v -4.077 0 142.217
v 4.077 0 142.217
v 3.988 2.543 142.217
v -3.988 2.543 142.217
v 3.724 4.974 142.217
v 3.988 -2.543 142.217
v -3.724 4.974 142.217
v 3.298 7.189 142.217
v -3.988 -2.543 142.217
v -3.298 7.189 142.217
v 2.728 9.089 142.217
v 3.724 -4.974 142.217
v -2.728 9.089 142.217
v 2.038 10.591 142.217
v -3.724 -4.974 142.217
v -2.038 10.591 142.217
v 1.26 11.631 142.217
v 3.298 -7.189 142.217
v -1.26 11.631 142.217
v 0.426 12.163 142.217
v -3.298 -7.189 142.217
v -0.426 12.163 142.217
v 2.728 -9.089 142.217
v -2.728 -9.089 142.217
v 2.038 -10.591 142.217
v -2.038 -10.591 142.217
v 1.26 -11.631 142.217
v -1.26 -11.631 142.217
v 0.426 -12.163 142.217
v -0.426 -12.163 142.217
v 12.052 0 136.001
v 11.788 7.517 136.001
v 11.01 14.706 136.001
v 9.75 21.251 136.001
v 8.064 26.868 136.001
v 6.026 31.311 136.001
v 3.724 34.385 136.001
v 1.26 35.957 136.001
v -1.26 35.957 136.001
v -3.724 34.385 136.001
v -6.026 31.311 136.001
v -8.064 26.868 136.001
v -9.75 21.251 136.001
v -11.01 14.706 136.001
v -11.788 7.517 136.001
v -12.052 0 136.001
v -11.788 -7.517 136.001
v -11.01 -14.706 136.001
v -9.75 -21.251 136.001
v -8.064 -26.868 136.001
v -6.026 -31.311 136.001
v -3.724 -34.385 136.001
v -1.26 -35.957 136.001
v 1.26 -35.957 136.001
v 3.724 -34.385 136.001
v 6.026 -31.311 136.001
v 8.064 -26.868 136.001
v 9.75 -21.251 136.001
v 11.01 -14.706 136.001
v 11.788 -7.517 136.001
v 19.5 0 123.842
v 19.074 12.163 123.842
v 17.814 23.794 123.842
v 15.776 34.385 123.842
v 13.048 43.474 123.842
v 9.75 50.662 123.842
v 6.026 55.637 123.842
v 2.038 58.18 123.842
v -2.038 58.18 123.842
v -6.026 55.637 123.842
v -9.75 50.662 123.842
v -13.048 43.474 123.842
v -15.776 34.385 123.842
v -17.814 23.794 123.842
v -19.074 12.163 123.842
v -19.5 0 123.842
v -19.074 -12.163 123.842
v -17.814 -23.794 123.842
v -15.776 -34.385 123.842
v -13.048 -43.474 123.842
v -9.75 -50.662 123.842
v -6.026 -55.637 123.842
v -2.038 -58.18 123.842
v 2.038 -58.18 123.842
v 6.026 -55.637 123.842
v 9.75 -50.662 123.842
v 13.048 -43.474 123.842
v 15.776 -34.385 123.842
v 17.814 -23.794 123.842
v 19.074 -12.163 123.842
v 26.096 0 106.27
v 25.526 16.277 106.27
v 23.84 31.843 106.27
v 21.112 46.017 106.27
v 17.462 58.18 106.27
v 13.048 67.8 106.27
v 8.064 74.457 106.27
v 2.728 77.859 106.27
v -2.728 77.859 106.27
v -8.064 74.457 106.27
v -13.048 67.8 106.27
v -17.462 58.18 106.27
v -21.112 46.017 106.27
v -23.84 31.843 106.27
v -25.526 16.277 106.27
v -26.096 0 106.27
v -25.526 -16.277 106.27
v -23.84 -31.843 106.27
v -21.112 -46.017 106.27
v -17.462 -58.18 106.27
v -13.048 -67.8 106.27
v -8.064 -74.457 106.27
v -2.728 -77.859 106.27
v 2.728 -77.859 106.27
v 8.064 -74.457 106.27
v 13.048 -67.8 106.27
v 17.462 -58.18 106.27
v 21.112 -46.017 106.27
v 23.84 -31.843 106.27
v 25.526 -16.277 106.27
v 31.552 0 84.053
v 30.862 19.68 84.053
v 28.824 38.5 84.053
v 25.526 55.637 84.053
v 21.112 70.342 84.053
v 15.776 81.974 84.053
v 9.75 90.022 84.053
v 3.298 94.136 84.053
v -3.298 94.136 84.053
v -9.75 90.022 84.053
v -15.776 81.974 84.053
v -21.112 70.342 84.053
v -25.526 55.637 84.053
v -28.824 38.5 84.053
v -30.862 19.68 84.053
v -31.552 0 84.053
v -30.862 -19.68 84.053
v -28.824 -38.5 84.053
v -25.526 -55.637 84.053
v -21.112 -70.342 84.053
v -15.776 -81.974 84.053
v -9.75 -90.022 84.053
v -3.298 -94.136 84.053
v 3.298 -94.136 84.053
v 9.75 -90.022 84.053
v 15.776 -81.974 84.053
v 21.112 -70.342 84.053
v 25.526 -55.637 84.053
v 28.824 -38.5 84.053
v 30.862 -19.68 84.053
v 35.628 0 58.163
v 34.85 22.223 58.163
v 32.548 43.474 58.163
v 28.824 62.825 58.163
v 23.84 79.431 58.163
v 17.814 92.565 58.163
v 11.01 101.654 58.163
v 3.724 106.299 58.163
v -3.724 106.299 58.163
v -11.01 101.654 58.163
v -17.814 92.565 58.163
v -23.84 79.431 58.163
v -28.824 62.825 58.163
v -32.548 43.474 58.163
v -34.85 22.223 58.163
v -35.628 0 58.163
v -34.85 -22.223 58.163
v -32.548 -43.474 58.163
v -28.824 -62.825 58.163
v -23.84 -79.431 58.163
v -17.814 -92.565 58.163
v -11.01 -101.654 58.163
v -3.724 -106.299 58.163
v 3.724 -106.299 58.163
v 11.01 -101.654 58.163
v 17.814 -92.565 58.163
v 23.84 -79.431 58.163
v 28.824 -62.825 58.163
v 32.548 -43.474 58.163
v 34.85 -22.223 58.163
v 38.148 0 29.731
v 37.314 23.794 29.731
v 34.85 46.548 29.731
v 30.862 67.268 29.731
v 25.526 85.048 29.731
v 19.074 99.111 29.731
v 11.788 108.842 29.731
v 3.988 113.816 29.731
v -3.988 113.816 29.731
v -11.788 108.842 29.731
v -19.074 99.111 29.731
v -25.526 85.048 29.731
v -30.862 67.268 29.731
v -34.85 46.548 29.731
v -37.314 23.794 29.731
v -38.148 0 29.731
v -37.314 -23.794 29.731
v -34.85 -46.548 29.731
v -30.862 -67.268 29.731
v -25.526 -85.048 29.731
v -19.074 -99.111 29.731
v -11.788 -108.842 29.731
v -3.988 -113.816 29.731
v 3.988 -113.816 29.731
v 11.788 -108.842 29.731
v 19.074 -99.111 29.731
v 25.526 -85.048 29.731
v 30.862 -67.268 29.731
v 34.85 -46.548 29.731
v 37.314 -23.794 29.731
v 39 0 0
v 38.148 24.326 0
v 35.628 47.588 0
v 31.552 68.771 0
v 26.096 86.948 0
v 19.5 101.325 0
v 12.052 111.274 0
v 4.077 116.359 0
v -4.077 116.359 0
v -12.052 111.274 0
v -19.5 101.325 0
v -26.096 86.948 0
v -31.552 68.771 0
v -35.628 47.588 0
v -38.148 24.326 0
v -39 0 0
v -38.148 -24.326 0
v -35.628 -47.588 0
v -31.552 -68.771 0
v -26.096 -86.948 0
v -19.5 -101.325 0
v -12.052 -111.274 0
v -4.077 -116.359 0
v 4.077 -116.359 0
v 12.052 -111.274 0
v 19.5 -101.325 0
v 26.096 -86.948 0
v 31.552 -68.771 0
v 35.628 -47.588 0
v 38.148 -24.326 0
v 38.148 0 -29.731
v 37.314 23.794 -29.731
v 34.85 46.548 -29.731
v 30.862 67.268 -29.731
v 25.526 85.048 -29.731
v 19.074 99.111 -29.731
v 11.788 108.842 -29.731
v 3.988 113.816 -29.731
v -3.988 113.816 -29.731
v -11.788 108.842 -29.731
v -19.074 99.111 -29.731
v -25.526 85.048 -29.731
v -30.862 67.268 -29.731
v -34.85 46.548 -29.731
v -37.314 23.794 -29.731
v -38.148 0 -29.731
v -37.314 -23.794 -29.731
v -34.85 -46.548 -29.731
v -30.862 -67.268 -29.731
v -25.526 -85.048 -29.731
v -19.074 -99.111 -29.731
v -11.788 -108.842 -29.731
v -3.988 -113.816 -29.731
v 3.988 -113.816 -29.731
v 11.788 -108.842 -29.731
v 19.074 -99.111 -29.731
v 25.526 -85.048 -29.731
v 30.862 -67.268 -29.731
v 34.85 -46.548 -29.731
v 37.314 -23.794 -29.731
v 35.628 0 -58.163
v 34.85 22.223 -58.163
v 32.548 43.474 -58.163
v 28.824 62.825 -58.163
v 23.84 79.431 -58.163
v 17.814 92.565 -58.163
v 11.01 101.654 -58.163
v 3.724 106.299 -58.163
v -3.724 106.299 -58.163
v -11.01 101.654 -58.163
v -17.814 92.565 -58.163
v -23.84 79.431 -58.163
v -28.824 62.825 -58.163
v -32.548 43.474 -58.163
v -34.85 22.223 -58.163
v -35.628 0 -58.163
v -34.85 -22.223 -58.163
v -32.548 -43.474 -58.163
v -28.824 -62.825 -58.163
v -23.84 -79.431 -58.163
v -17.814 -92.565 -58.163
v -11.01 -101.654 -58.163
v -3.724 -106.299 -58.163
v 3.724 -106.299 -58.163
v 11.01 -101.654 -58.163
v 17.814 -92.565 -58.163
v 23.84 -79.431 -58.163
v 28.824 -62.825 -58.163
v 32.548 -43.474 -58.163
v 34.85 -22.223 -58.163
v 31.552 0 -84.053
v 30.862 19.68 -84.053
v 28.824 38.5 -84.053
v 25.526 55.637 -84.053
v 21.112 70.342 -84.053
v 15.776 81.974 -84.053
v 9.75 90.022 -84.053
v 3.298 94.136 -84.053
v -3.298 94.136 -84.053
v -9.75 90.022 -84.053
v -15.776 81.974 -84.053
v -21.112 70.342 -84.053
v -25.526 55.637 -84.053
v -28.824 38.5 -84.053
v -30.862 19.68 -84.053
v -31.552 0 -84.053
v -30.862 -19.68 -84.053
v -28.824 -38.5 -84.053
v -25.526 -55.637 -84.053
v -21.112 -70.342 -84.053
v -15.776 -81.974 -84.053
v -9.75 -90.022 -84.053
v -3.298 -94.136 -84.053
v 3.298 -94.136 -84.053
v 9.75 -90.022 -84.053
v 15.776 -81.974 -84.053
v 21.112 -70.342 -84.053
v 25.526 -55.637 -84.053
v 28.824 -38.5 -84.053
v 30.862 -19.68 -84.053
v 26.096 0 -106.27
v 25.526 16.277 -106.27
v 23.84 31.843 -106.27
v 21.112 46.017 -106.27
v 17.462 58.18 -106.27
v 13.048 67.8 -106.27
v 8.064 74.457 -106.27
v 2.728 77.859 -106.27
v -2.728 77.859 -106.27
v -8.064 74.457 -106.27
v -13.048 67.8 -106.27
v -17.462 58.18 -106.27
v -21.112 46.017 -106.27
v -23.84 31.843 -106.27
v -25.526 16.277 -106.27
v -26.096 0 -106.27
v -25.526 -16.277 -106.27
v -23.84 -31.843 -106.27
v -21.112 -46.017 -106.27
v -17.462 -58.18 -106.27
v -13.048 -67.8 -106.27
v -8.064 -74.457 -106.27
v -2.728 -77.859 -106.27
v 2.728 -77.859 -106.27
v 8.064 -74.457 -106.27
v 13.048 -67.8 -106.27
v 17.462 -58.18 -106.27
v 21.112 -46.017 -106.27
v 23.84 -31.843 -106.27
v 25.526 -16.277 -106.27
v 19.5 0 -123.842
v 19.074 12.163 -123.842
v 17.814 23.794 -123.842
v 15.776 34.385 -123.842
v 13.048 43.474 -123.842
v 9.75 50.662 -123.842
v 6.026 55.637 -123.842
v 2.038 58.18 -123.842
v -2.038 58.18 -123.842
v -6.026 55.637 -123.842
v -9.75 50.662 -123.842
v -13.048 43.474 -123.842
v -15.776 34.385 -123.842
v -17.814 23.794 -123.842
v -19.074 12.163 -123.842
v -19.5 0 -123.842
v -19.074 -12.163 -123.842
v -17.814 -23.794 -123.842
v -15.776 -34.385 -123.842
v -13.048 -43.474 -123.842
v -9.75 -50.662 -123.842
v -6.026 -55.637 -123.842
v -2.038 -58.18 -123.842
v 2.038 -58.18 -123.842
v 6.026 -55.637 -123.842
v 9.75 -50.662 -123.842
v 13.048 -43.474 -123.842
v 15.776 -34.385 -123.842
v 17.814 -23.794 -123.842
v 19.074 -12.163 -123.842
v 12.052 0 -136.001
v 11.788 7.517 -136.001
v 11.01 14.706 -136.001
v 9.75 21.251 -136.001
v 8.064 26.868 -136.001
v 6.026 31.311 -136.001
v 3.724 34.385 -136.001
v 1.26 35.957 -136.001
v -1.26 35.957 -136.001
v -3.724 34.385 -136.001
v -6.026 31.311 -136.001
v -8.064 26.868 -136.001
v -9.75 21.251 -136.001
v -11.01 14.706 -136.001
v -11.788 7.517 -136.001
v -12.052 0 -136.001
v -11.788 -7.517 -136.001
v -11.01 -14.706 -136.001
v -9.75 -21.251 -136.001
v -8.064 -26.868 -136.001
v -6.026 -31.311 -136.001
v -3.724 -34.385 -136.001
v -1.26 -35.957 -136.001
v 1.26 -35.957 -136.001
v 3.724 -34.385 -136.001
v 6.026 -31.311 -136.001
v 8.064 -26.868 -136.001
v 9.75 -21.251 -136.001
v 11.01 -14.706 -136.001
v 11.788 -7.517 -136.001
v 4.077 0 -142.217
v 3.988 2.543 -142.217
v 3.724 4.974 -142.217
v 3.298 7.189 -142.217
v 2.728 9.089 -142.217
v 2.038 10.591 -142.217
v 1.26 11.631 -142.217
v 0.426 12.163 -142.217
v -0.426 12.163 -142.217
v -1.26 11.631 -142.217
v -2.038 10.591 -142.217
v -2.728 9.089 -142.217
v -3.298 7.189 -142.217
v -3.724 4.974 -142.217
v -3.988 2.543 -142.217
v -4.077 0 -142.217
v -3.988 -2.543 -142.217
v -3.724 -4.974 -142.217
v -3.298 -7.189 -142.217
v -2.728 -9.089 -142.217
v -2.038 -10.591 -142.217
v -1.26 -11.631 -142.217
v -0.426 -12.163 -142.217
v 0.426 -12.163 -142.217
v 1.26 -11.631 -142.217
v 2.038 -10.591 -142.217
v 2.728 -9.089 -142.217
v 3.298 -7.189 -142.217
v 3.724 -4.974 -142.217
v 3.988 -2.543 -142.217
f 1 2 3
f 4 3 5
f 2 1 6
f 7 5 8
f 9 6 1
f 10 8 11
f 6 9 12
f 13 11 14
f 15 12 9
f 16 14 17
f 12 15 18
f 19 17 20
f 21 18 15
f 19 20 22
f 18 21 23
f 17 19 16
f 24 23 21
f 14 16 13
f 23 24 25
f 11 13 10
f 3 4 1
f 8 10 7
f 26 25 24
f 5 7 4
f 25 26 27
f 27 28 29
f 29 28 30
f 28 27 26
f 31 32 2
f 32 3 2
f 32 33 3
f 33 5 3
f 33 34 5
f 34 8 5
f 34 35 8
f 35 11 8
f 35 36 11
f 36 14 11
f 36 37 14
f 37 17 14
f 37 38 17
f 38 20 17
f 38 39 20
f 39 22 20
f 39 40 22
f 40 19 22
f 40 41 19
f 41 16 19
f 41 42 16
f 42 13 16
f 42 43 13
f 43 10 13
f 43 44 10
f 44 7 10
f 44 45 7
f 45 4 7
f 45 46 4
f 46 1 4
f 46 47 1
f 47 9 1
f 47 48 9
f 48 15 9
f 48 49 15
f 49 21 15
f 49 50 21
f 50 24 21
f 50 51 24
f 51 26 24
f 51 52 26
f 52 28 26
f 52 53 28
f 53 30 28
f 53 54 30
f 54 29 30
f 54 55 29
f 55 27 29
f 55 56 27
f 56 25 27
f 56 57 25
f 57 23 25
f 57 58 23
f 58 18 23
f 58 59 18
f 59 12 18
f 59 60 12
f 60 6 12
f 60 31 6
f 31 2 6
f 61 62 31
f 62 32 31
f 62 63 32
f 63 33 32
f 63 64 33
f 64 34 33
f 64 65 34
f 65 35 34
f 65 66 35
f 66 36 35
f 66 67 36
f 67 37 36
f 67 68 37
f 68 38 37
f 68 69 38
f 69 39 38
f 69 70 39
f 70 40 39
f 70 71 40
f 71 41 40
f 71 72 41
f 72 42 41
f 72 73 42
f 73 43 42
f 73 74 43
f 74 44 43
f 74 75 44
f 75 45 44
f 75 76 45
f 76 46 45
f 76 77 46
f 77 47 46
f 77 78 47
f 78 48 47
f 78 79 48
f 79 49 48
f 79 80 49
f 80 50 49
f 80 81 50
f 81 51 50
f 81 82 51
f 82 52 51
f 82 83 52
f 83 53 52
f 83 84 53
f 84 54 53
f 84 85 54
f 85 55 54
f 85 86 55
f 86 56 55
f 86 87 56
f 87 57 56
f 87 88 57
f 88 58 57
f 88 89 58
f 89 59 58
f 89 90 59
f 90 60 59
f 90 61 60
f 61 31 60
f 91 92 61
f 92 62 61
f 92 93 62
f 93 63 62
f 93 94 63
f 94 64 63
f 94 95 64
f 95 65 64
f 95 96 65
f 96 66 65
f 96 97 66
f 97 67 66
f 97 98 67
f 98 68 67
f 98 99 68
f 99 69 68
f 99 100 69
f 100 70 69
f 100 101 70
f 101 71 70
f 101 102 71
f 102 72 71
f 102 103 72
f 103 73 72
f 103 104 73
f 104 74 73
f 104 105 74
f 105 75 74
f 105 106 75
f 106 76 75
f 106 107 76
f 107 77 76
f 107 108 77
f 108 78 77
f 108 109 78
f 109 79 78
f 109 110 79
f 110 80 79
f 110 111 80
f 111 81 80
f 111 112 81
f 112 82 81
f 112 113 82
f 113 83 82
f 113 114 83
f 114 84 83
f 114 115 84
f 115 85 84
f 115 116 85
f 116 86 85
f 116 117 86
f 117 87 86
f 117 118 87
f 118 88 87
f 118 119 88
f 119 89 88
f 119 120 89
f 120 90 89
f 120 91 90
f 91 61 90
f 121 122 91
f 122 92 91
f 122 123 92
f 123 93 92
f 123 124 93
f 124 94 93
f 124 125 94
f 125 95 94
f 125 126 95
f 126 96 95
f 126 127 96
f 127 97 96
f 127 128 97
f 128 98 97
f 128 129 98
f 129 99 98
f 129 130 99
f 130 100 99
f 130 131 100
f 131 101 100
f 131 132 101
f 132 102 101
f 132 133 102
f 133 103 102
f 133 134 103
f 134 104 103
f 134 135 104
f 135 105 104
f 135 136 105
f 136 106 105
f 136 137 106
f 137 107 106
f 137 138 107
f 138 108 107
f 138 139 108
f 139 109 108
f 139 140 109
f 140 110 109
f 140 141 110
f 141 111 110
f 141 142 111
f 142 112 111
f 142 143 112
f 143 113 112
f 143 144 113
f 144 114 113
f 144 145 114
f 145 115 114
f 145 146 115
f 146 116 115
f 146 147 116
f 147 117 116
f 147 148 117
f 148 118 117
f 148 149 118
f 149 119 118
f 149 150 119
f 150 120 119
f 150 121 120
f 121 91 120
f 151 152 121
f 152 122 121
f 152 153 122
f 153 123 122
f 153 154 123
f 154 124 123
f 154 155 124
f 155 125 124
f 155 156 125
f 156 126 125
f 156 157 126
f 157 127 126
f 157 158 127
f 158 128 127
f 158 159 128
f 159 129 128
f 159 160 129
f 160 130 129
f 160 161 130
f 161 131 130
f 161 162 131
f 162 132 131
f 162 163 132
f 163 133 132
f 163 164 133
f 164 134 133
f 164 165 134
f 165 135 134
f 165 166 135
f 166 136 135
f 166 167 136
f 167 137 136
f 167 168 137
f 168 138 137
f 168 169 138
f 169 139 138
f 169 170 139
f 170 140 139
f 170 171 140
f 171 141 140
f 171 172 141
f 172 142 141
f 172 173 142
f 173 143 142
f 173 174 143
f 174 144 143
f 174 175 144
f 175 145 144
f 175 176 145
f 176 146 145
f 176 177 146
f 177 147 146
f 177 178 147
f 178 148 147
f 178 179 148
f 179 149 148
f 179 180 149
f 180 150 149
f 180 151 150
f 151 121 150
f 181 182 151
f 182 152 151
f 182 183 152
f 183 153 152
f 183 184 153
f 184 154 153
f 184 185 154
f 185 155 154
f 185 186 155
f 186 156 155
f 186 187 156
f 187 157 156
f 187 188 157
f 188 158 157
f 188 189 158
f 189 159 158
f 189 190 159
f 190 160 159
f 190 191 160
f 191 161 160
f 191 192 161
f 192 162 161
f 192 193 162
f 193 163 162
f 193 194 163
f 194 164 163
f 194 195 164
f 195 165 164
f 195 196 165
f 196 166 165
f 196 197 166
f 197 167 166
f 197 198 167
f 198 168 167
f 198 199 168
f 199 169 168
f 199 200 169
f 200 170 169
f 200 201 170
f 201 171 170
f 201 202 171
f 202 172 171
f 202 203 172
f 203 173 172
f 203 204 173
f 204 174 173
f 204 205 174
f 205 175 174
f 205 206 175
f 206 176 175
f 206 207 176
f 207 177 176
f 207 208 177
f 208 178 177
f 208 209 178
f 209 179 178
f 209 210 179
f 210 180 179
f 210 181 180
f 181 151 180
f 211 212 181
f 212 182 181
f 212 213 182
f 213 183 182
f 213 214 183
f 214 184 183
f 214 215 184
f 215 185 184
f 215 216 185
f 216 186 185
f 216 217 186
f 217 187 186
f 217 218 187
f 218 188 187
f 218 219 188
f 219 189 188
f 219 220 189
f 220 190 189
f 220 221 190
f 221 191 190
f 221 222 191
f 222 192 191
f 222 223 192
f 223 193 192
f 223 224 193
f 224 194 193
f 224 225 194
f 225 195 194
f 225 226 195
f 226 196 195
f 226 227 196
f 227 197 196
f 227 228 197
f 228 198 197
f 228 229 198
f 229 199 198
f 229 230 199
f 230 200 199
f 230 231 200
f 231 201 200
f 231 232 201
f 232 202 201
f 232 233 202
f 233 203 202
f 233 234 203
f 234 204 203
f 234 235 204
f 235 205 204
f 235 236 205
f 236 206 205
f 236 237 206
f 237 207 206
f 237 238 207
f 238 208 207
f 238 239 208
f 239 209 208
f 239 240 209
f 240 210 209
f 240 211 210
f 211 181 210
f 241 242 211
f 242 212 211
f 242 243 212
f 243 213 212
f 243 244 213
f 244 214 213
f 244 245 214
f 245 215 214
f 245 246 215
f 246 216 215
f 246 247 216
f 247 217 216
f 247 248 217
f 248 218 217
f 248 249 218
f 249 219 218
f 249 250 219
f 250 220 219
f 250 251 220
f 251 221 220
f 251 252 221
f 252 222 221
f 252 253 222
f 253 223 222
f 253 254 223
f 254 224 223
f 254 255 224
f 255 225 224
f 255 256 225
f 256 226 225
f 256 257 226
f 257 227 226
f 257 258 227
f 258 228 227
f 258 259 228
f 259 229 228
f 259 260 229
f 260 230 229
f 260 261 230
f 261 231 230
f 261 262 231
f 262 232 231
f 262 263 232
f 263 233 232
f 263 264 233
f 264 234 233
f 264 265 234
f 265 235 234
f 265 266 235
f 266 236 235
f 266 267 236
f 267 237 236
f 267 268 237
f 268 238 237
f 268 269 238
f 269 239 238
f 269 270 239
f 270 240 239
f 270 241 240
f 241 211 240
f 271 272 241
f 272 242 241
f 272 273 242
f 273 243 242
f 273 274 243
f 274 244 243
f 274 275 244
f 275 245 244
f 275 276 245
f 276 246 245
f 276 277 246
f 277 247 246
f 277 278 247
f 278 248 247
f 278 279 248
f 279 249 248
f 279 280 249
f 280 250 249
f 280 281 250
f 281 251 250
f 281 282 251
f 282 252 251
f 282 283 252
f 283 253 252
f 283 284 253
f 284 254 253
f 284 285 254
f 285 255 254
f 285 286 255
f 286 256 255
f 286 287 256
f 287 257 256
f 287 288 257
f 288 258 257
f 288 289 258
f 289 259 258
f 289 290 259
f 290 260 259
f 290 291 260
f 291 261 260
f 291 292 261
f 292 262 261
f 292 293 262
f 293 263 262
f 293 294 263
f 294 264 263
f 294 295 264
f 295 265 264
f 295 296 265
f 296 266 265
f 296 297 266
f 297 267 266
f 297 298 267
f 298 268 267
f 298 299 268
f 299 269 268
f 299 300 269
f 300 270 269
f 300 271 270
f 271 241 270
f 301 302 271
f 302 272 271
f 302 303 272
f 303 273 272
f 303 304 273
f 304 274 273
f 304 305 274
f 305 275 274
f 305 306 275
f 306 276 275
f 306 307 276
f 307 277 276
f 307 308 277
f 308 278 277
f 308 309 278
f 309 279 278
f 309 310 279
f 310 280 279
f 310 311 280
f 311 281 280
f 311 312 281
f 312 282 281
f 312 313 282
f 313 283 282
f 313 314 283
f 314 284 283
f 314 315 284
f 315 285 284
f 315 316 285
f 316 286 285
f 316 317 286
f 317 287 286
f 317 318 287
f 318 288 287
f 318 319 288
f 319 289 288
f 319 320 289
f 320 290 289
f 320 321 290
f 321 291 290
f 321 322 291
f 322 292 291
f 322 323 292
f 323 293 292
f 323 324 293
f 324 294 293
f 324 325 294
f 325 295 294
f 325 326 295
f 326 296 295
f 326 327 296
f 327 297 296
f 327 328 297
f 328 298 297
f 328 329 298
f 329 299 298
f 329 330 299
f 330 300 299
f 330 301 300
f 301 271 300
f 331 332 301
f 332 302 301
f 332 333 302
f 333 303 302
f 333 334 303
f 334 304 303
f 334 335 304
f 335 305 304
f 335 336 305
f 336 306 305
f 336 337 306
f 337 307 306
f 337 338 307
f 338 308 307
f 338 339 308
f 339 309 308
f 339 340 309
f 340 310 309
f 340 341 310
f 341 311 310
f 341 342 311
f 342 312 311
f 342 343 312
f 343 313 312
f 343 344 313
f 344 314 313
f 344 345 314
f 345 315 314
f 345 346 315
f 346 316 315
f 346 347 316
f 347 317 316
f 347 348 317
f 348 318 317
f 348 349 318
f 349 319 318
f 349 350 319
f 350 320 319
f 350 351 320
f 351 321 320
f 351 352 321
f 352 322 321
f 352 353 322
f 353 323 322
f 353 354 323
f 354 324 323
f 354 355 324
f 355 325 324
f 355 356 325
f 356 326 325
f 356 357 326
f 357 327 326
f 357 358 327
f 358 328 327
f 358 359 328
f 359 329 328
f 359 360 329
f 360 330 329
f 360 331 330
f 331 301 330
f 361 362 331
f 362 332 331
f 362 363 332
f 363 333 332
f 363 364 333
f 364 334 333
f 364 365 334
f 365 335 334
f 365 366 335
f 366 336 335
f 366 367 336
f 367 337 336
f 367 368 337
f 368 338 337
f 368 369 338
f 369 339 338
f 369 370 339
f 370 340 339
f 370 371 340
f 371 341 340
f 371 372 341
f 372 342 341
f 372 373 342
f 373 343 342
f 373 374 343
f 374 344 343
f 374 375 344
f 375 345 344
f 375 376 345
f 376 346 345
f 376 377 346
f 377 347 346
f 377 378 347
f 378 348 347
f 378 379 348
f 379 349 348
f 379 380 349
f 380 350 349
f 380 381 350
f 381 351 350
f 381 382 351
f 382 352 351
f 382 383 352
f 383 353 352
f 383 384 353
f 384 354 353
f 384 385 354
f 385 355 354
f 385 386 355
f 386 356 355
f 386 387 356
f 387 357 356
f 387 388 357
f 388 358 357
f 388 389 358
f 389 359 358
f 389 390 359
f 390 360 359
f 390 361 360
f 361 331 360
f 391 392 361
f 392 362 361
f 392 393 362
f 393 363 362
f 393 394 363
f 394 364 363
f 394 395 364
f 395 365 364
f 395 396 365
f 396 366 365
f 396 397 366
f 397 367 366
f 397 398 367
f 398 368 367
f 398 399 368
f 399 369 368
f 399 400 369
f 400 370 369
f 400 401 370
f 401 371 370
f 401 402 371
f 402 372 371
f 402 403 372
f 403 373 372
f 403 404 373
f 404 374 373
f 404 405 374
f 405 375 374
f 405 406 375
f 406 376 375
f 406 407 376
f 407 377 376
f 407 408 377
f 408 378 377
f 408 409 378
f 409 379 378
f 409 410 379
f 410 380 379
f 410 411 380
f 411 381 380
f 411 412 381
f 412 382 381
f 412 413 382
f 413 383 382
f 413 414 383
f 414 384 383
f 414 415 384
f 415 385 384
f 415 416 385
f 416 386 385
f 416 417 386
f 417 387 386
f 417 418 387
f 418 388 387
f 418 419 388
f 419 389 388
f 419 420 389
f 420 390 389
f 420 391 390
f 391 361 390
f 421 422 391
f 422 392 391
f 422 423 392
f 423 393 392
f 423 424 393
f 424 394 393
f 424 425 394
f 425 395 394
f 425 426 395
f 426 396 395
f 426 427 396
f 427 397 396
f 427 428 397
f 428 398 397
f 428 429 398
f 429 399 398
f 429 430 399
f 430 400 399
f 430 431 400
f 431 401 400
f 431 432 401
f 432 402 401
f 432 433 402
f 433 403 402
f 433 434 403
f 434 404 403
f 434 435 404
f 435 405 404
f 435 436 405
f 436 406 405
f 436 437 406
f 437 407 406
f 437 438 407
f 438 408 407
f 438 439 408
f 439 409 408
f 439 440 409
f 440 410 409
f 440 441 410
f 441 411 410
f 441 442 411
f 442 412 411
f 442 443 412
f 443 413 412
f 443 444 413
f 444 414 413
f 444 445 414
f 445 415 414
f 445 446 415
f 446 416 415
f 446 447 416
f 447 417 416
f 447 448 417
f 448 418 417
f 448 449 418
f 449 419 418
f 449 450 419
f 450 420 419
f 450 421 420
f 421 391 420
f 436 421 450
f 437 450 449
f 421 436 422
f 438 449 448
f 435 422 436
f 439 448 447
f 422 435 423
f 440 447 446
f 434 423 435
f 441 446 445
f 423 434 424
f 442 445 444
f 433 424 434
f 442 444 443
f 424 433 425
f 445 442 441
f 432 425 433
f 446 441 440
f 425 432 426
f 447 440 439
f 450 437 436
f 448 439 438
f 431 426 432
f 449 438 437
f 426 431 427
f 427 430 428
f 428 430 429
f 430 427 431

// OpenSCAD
// Generated by SolidPython 1.0.1 on 2020-07-29 00:46:45


scale(v = [3, 9, 11]) {
	sphere(r = 13);
}
/***********************************************
*********      SolidPython code:      **********
************************************************
 
# import packages: SolidPython
from solid import *
from solid.utils import *
from itertools import chain, combinations, permutations


class Resize:

    def __init__(self, scad_file):
        self.scad_file = scad_file
        #self.scad_file = import_scad(scad_file)
        # cone/cylinder param:
        self.r1 = 0
        self.r2 = 0
        self.h = 0
        # rectangular prism param:
        self.w = 0
        self.l = 0
        # ellipse param:
        self.r = 0

    # import OpenScad code (file name corresponds to shape)


    # classify shape + parameters
    def assign(self, param1, param2, param3):
        if self.scad_file == 'cone.scad':
            self.r1 = param1
            self.r2 = param2
            self.h = param3
        elif self.scad_file == 'cylinder.scad':
            self.r1 = param1
            self.r2 = param2
            self.h = param3
        elif self.scad_file == 'rectangularPrism.scad':
            self.h = param1
            self.l = param2
            self.w = param3
        else:
            self.r = param1
            self.h = param2

    # resize parameters
    def iterate(self):
        x = range(3, 20, 2)
        i = 1
        if self.scad_file == 'cone.scad':
            tempList = list(permutations(x, 2))
            for temp in tempList:
                param1 = temp[0]
                param2 = temp[1]
                filepath = 'produced_scad_files/' + 'cone' + str(param1) + '_' + str(param2) + '_' + '.scad'
                scad_render_to_file(cylinder(h=param1, r1=param2, r2=0), filepath)

        elif self.scad_file == 'cylinder.scad':
            tempList = list(permutations(x, 3))
            for temp in tempList:
                param1 = temp[0]
                param2 = temp[1]
                filepath = 'produced_scad_files/' + 'cylinder' + str(param1) + '_' + str(param2) + '_' + '.scad'
                scad_render_to_file(cylinder(h=param1, r1=param2, r2=param2), filepath)

        elif self.scad_file == 'rectangularPrism.scad':
            tempList = list(permutations(x, 3))
            for temp in tempList:
                param1 = temp[0]
                param2 = temp[1]
                param3 = temp[2]
                filepath = 'produced_scad_files/' + 'rectangularPrism' + str(param1) + '_' + str(param2) + '_' + str(
                    param3) + '.scad'
                scad_render_to_file(cube(size=(param1, param2, param3)), filepath)

        elif self.scad_file == 'ellipse.scad':
            tempList = list(permutations(x, 4))
            for temp in tempList:
                param1 = temp[0]
                param2 = temp[1]
                param3 = temp[2]
                param4 = temp[3]
                filepath = 'produced_scad_files/' + 'ellipse' + str(param1) + '_' + str(param2) + '_' + str(param3) + '_' + str(param4) + '.scad'
                scad_render_to_file(scale([param1, param2, param3])(sphere(r=param4)), filepath)

    def render_to_scadfile(self):
        scad_render_to_file(scad, 'example.scad') 
 
************************************************/
